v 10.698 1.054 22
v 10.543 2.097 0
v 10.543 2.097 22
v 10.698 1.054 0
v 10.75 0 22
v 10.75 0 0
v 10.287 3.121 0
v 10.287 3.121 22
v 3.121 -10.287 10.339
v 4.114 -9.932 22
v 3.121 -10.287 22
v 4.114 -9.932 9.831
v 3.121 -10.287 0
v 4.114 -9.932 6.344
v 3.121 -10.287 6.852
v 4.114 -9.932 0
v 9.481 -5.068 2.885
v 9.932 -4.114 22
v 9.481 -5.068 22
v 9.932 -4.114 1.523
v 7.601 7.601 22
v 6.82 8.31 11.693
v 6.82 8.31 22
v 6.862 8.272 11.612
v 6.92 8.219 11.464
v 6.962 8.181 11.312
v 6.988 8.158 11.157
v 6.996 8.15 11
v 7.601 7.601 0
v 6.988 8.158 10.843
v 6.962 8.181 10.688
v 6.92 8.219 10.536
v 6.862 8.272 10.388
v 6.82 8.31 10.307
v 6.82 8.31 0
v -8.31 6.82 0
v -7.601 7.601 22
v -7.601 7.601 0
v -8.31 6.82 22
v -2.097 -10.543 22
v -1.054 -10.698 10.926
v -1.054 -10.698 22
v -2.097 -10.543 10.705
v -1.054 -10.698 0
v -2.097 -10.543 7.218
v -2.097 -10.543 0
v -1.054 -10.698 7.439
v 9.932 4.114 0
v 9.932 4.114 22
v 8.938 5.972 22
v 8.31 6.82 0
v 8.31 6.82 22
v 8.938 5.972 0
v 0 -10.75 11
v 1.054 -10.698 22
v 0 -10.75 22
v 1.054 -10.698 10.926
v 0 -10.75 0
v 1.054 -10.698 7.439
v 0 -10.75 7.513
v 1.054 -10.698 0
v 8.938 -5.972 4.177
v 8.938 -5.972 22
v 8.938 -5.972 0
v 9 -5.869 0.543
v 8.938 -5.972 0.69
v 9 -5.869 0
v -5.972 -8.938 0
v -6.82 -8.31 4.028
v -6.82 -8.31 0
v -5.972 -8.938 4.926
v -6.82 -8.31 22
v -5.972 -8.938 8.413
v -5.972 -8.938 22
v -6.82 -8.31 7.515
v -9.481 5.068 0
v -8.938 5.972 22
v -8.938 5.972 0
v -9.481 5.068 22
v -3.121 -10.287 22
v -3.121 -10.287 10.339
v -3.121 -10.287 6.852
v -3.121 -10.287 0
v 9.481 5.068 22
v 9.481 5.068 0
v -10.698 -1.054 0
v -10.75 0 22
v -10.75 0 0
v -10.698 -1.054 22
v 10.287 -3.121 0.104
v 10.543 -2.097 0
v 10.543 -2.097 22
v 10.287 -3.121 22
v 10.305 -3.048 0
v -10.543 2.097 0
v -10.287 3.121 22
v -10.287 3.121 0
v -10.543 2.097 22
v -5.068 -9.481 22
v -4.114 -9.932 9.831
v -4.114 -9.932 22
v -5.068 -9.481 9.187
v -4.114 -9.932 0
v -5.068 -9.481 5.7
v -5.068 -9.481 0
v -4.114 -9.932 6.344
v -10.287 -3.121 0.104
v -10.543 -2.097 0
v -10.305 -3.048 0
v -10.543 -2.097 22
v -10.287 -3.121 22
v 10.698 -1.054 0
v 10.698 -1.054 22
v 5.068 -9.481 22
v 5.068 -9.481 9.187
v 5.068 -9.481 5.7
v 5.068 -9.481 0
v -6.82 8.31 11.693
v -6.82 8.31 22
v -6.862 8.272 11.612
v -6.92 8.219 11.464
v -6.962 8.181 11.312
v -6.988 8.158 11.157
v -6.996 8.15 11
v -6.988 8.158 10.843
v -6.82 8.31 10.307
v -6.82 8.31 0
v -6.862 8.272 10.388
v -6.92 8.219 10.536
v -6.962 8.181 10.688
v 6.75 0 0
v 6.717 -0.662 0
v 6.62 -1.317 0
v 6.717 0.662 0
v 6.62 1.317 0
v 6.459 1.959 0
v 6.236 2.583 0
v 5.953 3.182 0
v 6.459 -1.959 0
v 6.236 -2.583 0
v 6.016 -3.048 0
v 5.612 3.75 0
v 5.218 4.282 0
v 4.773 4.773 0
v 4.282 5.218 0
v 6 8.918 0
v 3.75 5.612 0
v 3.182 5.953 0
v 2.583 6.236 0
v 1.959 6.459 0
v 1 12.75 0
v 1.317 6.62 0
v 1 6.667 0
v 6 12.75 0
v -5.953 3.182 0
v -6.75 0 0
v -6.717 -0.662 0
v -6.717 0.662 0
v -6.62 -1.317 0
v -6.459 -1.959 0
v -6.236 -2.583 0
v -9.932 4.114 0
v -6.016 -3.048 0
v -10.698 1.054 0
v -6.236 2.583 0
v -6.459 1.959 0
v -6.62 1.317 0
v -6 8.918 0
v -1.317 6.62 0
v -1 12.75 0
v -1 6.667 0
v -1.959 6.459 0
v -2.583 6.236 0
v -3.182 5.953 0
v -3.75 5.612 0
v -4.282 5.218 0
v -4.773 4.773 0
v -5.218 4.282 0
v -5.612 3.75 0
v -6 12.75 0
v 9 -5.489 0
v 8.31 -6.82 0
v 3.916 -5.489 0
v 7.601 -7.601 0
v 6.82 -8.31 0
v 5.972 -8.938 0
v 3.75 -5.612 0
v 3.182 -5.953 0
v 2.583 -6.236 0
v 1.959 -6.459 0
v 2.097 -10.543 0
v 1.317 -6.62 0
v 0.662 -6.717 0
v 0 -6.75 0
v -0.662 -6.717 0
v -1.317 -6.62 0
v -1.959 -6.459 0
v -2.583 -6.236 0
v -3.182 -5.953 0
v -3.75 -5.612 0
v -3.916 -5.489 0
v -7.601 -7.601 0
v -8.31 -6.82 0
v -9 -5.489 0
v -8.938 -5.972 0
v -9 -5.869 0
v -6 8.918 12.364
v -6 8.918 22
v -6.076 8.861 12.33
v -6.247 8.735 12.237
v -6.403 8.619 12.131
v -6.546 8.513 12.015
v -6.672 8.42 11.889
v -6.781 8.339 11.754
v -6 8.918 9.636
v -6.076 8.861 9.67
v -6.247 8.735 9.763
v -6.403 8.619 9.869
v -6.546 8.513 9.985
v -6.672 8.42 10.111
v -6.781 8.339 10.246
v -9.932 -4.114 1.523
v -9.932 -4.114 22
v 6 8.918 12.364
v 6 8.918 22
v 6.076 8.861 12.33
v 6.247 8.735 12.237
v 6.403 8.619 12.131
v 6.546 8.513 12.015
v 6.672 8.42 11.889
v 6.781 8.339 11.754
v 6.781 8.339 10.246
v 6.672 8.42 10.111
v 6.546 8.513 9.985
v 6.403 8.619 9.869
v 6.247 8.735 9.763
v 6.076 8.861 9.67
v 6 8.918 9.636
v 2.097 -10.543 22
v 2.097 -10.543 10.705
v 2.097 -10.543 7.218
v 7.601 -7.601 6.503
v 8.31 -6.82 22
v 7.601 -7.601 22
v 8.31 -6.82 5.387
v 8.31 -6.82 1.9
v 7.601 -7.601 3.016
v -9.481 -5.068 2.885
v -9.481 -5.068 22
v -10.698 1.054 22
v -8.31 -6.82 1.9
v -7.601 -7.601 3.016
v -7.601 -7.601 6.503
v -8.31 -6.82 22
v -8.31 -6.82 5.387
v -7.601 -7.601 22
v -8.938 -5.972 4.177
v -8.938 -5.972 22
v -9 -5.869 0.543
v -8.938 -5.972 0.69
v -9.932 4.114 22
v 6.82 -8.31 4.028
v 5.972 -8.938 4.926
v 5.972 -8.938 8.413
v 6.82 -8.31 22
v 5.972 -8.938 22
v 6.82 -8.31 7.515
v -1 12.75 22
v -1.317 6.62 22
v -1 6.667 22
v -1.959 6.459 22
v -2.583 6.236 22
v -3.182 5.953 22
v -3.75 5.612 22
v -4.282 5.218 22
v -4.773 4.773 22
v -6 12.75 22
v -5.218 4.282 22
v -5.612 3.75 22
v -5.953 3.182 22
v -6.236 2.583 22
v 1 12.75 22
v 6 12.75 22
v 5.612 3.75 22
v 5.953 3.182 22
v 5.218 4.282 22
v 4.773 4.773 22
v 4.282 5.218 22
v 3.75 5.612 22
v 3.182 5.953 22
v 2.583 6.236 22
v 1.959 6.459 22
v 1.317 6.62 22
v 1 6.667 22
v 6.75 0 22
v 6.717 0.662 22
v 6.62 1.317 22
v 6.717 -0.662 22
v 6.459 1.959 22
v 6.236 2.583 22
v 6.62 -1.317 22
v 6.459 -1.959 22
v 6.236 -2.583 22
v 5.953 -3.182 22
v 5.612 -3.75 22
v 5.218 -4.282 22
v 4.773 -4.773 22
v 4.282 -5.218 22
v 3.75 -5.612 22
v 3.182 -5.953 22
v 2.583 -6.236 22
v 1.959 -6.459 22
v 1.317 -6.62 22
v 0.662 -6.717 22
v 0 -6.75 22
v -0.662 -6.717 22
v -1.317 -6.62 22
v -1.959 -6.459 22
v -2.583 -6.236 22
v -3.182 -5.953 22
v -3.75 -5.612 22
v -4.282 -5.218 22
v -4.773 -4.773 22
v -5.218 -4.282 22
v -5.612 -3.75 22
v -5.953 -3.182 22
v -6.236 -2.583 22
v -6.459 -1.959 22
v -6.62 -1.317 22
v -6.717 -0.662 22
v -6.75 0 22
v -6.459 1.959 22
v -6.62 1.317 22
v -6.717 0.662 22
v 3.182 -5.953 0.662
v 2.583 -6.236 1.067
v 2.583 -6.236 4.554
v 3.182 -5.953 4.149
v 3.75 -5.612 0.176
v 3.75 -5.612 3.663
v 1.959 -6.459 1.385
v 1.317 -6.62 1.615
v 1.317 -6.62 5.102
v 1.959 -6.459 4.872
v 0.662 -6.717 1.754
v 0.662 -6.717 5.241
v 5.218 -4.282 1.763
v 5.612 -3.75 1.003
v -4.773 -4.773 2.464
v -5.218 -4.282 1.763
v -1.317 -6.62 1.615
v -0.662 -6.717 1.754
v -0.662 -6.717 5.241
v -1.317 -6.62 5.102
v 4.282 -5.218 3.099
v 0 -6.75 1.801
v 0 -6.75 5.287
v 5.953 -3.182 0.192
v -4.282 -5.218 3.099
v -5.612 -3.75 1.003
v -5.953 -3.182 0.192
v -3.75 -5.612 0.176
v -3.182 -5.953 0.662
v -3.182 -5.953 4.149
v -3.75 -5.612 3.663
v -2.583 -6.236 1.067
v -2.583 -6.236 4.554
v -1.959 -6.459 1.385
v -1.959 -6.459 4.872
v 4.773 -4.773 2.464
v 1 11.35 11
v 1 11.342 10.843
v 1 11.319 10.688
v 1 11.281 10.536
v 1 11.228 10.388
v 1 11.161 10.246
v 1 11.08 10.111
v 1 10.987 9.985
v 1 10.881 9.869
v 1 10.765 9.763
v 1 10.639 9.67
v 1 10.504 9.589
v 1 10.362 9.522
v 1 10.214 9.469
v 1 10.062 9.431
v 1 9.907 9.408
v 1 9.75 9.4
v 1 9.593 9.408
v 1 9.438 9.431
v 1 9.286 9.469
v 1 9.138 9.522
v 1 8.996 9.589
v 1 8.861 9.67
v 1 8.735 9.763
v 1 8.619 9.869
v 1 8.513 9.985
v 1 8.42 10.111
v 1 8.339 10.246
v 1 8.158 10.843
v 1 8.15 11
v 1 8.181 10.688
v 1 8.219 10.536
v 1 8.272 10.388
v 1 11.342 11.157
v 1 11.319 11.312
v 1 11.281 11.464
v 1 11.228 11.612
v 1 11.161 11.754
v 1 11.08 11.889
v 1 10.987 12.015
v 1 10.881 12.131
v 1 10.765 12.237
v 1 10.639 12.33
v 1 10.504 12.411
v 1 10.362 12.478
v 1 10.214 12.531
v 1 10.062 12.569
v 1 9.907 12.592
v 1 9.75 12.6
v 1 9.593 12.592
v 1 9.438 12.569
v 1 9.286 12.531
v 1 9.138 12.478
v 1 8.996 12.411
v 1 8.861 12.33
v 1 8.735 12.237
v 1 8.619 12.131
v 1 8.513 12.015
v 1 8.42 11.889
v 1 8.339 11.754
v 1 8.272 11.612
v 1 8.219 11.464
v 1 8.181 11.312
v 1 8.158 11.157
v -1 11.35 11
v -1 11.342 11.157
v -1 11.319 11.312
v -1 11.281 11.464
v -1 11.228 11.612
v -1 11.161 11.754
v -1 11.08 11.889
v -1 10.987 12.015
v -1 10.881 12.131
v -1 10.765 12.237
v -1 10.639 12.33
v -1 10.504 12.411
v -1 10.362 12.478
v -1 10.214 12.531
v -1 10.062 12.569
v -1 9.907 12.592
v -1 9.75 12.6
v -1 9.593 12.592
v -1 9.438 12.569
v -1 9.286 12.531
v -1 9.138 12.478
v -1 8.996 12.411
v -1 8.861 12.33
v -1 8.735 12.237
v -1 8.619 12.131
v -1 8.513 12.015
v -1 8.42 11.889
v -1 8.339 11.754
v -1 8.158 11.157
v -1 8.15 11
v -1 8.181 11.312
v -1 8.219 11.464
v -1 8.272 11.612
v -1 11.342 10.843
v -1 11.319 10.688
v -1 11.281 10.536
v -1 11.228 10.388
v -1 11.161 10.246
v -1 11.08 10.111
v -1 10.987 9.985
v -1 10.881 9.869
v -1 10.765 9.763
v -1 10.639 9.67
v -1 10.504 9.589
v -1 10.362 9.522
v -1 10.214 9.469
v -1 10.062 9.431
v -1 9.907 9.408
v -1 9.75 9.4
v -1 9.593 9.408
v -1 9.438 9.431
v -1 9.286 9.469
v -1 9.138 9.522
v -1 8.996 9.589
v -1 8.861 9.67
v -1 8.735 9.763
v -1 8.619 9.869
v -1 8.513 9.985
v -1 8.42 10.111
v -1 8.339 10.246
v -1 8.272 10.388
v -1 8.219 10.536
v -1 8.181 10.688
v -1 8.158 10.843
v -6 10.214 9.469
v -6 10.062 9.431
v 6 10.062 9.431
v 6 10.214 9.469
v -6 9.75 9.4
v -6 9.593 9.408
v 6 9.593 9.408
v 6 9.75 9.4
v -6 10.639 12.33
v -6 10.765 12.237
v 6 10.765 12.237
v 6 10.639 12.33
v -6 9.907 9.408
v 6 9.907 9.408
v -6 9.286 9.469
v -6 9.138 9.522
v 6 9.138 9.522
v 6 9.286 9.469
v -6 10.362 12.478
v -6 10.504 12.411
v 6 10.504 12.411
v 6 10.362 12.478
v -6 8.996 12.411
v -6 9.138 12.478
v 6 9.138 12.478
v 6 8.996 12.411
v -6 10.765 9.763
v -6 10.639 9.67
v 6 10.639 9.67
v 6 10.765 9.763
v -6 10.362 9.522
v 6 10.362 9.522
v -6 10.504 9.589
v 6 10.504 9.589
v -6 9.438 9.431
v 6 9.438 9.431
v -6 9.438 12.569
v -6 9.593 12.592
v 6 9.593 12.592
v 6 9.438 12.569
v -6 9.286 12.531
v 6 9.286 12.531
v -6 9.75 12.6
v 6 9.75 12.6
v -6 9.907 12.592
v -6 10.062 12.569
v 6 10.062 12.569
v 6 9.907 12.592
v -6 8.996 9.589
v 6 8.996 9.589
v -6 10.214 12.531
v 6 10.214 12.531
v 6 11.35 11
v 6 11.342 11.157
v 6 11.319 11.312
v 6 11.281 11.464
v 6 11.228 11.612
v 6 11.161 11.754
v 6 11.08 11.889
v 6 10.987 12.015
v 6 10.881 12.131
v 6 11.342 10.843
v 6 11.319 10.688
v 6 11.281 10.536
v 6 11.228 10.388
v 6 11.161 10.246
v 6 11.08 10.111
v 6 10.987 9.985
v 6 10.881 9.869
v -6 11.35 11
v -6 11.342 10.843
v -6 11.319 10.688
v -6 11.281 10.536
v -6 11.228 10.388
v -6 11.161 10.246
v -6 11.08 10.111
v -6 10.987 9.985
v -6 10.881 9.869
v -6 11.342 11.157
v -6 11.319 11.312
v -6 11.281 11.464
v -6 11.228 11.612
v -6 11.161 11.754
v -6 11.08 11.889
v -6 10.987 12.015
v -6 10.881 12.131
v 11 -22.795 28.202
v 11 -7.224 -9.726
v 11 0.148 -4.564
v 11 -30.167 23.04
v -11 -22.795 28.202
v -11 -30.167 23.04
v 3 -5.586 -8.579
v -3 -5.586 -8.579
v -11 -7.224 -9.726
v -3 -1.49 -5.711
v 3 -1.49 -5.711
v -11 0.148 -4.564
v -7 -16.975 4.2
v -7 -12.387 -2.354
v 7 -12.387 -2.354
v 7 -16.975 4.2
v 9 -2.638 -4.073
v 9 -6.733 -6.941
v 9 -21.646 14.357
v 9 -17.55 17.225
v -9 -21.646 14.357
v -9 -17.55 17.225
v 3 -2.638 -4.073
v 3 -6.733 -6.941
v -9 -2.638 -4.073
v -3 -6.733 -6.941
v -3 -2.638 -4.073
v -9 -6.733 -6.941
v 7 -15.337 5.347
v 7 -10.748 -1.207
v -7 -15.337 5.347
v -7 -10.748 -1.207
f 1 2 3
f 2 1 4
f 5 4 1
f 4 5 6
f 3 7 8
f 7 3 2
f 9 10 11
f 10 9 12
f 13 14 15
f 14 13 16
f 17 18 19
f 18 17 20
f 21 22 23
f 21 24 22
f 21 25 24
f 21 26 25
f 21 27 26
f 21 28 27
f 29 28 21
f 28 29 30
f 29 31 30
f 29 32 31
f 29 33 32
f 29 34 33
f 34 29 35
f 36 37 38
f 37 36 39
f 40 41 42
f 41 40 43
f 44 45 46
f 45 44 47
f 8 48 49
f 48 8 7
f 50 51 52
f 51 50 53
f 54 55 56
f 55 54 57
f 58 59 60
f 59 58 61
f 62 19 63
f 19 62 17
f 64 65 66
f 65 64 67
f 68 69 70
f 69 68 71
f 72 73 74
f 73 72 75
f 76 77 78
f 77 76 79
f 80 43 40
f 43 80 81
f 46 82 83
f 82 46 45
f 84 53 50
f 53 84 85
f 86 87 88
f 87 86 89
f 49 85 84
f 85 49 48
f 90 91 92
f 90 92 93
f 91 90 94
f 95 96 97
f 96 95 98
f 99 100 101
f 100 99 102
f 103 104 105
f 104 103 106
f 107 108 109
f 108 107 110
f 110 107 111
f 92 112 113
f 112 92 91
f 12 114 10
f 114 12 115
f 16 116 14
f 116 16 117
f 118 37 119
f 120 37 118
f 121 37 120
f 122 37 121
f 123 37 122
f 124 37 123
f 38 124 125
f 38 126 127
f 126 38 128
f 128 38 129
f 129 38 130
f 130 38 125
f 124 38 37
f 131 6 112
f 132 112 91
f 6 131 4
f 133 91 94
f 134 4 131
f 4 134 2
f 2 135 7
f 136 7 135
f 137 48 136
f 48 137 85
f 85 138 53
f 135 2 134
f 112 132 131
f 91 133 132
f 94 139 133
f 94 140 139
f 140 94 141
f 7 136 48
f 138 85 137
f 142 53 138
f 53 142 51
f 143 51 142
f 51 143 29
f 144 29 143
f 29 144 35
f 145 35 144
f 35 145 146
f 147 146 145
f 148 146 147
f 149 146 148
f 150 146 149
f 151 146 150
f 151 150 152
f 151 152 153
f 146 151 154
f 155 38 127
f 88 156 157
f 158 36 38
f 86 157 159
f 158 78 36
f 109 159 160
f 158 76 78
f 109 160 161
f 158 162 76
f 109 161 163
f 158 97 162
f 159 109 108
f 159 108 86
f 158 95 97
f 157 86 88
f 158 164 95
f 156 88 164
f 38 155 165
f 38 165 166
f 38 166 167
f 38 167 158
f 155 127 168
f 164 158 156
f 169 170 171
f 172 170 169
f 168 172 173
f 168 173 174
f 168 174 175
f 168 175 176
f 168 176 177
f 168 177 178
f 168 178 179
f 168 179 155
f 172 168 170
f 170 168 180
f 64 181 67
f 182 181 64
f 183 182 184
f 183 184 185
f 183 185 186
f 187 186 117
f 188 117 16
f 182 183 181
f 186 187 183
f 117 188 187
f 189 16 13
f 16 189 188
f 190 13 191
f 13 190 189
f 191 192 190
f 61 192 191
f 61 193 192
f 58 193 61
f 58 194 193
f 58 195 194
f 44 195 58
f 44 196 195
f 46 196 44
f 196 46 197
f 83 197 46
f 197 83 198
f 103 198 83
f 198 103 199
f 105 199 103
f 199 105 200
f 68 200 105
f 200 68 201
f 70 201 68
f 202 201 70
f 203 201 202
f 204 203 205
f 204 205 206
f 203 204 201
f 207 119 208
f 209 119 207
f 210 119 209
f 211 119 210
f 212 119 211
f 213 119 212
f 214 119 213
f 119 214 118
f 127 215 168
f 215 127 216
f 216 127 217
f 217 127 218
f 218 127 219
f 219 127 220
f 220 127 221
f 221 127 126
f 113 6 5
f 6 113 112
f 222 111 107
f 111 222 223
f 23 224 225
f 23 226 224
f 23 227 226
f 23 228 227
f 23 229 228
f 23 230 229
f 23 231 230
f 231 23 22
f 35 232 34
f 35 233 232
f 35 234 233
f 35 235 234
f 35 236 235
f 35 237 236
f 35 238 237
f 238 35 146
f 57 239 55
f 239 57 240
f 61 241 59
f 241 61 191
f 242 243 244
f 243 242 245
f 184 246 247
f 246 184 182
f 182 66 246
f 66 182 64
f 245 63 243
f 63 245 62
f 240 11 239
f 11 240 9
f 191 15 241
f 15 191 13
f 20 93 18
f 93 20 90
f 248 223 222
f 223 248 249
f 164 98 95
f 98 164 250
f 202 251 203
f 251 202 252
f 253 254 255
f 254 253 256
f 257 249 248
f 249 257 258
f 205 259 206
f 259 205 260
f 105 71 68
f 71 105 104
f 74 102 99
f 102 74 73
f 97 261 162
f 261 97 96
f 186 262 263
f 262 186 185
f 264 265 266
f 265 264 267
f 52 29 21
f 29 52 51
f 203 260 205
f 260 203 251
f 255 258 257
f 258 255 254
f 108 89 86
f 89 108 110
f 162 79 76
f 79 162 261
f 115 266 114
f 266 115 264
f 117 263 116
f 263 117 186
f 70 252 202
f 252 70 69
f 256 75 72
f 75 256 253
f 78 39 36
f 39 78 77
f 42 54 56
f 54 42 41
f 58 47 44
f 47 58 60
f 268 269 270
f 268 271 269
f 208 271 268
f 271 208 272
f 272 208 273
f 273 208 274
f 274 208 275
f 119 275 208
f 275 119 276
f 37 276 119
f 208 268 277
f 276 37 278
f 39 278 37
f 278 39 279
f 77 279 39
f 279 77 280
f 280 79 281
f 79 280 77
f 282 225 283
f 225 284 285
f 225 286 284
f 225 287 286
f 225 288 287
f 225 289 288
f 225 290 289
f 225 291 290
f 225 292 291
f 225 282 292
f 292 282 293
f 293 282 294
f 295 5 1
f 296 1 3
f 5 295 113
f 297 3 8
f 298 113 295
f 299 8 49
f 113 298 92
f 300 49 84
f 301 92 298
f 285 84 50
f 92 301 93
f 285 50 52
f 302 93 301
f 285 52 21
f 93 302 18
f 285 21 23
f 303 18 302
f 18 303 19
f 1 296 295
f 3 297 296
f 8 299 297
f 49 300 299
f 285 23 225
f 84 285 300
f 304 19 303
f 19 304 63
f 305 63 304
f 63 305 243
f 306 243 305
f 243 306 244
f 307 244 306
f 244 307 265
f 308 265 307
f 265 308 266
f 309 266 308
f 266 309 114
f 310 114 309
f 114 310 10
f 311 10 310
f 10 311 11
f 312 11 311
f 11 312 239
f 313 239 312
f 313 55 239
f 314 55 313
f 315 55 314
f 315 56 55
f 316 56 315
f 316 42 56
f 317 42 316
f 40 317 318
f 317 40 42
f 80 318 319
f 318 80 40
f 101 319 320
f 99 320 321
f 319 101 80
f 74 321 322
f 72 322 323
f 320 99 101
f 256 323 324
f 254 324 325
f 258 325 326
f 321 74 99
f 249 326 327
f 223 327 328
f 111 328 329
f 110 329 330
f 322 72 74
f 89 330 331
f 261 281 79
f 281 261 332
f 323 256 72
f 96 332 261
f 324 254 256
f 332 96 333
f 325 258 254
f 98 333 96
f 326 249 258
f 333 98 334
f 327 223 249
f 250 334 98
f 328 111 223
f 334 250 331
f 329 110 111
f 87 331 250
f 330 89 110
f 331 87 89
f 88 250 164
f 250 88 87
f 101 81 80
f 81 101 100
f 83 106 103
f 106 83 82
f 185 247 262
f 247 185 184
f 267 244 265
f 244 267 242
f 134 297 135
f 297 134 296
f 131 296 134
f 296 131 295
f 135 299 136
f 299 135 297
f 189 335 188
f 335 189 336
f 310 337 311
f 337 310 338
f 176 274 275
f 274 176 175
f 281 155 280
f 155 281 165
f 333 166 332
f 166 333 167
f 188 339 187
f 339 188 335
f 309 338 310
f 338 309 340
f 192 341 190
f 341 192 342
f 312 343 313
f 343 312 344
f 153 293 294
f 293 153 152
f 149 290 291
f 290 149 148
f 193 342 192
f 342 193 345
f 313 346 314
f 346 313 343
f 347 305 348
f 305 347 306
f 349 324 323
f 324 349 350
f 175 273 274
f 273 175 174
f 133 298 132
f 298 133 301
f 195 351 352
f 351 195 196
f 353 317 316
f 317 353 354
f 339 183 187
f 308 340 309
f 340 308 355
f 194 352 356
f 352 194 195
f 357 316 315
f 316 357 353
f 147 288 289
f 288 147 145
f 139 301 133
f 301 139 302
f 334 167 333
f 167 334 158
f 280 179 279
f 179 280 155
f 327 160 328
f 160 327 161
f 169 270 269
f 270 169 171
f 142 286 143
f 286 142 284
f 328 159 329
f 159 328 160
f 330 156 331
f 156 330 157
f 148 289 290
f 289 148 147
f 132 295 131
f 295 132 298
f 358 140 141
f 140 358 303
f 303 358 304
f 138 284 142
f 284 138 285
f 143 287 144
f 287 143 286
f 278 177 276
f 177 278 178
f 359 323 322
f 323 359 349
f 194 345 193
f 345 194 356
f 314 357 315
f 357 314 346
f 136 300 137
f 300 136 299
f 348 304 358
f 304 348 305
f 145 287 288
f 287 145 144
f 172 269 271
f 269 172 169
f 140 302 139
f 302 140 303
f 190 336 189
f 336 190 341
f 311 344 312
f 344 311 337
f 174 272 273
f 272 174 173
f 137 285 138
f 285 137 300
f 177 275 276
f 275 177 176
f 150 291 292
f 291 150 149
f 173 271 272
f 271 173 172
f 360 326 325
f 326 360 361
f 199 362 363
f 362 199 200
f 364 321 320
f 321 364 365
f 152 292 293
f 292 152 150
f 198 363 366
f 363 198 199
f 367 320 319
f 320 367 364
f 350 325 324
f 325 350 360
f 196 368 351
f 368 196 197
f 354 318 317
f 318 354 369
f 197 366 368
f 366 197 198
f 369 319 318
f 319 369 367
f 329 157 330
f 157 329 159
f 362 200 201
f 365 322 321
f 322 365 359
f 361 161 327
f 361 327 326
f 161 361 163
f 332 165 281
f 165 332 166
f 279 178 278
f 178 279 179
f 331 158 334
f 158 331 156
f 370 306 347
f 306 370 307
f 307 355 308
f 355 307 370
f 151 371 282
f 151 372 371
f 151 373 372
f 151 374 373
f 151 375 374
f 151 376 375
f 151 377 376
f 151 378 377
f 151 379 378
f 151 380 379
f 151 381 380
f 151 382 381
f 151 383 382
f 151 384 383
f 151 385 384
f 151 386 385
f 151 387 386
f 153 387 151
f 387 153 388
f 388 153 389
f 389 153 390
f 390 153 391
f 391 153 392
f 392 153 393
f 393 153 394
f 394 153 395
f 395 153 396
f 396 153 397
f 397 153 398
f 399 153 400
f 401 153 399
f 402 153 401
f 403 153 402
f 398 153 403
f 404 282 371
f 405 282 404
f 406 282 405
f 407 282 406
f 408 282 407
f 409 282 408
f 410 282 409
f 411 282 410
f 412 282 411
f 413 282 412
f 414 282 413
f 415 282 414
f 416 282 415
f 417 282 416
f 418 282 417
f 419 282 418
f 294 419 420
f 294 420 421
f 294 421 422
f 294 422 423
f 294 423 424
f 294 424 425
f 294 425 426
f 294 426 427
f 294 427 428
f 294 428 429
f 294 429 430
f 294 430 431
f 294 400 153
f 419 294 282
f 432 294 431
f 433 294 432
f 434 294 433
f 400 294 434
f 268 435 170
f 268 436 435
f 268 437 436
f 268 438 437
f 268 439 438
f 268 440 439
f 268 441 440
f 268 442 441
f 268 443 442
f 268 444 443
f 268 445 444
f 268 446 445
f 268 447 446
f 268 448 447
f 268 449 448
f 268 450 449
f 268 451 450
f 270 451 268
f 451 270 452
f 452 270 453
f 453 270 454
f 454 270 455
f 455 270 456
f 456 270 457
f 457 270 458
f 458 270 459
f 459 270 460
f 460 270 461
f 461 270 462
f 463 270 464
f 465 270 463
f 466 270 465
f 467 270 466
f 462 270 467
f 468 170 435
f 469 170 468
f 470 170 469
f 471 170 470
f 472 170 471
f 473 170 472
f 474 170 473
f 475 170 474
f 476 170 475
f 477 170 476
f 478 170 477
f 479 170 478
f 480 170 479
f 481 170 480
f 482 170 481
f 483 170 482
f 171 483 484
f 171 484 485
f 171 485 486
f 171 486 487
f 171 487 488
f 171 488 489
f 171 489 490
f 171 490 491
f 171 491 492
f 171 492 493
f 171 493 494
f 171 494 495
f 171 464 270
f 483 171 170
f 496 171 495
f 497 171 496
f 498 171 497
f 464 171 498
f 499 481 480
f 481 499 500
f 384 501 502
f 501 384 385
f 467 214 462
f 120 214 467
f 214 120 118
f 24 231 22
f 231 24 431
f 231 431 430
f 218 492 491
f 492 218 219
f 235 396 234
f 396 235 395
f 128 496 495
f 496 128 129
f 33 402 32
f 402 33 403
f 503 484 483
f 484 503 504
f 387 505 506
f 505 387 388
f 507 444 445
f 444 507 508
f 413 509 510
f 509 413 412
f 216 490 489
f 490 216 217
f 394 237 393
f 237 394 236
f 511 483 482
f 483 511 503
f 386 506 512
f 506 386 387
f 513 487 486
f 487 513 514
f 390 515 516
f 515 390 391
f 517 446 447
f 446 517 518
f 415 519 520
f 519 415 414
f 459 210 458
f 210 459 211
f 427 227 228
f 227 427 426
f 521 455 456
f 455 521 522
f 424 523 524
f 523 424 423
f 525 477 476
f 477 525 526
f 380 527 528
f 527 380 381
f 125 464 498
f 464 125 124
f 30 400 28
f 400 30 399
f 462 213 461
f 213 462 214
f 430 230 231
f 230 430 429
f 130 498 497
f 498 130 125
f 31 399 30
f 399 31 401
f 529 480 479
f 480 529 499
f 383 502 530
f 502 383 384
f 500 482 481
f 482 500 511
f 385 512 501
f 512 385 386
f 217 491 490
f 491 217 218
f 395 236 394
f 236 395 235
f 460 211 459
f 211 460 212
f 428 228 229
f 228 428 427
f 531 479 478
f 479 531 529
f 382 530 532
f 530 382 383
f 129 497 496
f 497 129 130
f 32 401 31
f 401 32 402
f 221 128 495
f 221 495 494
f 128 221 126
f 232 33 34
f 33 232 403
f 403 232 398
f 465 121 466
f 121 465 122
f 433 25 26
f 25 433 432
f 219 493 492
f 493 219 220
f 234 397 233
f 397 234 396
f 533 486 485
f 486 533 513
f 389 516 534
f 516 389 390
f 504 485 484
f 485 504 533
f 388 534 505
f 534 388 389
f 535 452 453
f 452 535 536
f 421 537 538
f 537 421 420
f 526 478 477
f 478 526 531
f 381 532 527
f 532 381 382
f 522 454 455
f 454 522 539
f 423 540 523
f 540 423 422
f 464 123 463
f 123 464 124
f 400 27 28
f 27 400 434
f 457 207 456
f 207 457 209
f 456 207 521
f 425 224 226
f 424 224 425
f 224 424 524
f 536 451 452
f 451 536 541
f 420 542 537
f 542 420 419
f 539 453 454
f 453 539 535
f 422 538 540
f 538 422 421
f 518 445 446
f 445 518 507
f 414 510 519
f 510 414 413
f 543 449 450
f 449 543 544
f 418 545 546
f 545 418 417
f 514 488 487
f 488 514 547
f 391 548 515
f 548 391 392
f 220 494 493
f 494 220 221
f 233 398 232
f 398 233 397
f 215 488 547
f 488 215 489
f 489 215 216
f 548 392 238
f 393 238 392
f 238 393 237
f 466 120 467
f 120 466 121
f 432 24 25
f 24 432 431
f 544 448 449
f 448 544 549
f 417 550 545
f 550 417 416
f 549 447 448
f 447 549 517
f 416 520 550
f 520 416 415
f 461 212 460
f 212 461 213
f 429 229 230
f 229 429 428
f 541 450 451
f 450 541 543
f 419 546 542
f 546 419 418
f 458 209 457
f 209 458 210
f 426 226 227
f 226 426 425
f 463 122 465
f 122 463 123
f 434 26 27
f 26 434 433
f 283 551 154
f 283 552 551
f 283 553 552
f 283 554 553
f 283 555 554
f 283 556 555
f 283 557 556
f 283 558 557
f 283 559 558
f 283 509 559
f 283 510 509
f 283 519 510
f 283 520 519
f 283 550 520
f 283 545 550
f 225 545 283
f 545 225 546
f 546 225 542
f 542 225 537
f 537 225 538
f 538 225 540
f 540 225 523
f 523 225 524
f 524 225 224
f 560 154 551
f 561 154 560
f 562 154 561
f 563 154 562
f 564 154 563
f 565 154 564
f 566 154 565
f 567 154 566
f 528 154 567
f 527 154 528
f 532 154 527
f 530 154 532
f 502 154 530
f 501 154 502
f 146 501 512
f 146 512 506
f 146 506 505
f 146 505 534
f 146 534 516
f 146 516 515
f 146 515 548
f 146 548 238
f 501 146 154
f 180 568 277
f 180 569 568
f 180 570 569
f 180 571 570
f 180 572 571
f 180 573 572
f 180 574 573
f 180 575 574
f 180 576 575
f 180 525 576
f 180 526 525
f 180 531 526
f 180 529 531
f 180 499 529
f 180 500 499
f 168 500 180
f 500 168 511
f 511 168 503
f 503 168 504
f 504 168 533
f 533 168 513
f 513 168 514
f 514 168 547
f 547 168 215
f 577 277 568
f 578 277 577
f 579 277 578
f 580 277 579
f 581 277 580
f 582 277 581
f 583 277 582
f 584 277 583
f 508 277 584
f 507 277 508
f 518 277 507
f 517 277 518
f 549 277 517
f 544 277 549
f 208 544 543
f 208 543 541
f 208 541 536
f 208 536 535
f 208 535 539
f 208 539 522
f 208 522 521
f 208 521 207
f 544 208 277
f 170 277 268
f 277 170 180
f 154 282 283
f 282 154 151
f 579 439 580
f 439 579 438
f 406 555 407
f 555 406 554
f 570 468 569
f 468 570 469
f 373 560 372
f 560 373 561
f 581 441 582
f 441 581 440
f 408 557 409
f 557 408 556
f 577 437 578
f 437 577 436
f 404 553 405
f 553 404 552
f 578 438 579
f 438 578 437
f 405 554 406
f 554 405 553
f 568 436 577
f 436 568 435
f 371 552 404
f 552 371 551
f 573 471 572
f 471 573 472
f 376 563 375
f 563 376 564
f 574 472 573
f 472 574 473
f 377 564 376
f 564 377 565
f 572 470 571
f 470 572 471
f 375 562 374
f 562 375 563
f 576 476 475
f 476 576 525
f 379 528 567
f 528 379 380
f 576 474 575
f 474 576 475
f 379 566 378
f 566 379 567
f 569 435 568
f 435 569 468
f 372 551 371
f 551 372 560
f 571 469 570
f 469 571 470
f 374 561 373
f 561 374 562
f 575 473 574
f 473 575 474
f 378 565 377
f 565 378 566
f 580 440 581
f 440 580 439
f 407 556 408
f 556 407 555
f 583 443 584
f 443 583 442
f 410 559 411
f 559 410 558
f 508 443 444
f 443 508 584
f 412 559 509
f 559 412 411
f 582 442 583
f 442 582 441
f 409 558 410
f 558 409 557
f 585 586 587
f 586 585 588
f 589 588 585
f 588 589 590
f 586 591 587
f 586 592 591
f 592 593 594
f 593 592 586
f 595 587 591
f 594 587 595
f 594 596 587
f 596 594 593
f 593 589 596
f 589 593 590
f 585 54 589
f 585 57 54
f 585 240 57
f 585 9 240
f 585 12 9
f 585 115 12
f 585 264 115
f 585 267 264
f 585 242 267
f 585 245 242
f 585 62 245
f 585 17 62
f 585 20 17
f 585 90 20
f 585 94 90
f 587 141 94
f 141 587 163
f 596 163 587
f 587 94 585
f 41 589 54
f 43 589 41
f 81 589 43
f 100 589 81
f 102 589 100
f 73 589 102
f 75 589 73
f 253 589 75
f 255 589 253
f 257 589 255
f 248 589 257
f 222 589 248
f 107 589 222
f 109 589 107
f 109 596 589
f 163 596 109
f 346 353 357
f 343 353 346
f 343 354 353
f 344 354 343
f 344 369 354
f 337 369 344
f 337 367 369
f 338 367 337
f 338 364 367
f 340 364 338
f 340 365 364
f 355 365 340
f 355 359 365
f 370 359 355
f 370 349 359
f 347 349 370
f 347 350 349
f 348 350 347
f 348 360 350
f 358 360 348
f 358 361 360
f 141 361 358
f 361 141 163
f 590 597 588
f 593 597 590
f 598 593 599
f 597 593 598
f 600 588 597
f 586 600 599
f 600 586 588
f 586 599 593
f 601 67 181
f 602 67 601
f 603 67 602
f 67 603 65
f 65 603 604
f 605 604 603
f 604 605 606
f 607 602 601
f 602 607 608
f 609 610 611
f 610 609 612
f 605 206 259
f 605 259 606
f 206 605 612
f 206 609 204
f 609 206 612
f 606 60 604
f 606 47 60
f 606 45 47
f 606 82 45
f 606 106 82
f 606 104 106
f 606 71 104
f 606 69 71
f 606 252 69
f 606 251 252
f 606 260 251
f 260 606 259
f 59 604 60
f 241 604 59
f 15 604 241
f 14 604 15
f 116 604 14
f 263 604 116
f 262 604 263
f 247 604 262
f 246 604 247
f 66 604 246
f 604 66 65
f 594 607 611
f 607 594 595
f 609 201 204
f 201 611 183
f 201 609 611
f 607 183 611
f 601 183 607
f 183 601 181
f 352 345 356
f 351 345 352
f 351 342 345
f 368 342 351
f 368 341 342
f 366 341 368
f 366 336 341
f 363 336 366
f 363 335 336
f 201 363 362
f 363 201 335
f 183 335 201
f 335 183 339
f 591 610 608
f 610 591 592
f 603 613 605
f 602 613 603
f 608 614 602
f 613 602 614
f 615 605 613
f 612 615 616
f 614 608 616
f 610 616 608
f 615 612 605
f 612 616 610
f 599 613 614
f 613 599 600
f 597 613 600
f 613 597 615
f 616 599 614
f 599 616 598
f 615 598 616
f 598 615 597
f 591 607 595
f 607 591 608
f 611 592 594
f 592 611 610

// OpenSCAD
// sensor_pod.scad — hooded tube clamp for a VL53L1X breakout (Adafruit 25.5 x 17.5 x 4.6 mm)
// Clamps a 12.7 mm cane shaft, aims the sensor down-forward at the ground ahead.
// DRAFT: unrendered. Verify the sensor pocket against your actual breakout.
// Print: PETG, hood opening up, may need supports under the hood lip.
// LEGACY (ESP32 era, cut when the app went phone-only): do not print for the demo.
// Sized for a 12.7 mm aluminium/graphite shaft; the prototype stick is 27.65 mm (measured
// so nothing here fits it. The live mount is hardware/mount_screwless/ (see
// cad/README.md and hardware/README.md). Not rendered by any script (scripts/build_stl.ps1 covers
// hardware/ only); no tests; no owner on the current team. Units: millimetres throughout.
// Why it existed: the VL53L1X ground-distance sensor for the grip firmware's local drop-off /
// step-up fail-safe (firmware/canekit_grip/tof.cpp; README says aim ~40-60 cm ahead of the tip).
// The phone-only app replaced it with LiDAR ground hazards (AGENTS.md, Step 11).

$fn = 64;
shaft_d = 12.7; clear = 0.4;
clamp_len = 22; clamp_wall = 4;
aim_deg = 35;                 // tilt down from the shaft axis
brd_l = 26; brd_w = 18; brd_t = 5;   // sensor board pocket (adds clearance)
hood_len = 10;                // lip over the ToF window to shed rain
bolt_d = 3.2;

// Split ring clamping the shaft (axis +Z), with a pinch-bolt ear on the +Y side.
module clamp_ring() {
    difference() {
        cylinder(d = shaft_d + 2*clear + 2*clamp_wall, h = clamp_len);
        translate([0,0,-1]) cylinder(d = shaft_d + 2*clear, h = clamp_len + 2);
        // split
        translate([-1, 0, -1]) cube([2, shaft_d, clamp_len + 2]);
        // pinch bolt
        translate([0, shaft_d/2 + clear + 3, clamp_len/2]) rotate([0, 90, 0]) cylinder(d = bolt_d, h = 30, center = true);
    }
    // bolt ears
    difference() {
        translate([-6, shaft_d/2 + clear, 0]) cube([12, 6, clamp_len]);
        translate([-1, shaft_d/2 - 1, -1]) cube([2, 10, clamp_len + 2]);
        translate([0, shaft_d/2 + clear + 3, clamp_len/2]) rotate([0, 90, 0]) cylinder(d = bolt_d, h = 30, center = true);
    }
}
// Open-fronted box for the breakout: board pocket, a window for the sensor, a cable slot at the
// bottom, and hood_len of wall beyond the board as the rain hood.
module sensor_box() {
    difference() {
        translate([-brd_w/2 - 2, -brd_t - 4, 0]) cube([brd_w + 4, brd_t + 4, brd_l + 4 + hood_len]);
        translate([-brd_w/2, -brd_t - 2, 2]) cube([brd_w, brd_t, brd_l]);         // board pocket
        translate([-brd_w/2 + 2, -brd_t - 5, brd_l/2 - 4]) cube([brd_w - 4, 4, 8]); // window
        translate([-3, -brd_t - 2, -1]) cube([6, brd_t, 4]);                          // cable slot
    }
}
clamp_ring();
translate([0, -(shaft_d/2 + clear + clamp_wall), clamp_len/2])
    rotate([aim_deg, 0, 0]) translate([0, 0, -brd_l/2 - 6]) sensor_box();
